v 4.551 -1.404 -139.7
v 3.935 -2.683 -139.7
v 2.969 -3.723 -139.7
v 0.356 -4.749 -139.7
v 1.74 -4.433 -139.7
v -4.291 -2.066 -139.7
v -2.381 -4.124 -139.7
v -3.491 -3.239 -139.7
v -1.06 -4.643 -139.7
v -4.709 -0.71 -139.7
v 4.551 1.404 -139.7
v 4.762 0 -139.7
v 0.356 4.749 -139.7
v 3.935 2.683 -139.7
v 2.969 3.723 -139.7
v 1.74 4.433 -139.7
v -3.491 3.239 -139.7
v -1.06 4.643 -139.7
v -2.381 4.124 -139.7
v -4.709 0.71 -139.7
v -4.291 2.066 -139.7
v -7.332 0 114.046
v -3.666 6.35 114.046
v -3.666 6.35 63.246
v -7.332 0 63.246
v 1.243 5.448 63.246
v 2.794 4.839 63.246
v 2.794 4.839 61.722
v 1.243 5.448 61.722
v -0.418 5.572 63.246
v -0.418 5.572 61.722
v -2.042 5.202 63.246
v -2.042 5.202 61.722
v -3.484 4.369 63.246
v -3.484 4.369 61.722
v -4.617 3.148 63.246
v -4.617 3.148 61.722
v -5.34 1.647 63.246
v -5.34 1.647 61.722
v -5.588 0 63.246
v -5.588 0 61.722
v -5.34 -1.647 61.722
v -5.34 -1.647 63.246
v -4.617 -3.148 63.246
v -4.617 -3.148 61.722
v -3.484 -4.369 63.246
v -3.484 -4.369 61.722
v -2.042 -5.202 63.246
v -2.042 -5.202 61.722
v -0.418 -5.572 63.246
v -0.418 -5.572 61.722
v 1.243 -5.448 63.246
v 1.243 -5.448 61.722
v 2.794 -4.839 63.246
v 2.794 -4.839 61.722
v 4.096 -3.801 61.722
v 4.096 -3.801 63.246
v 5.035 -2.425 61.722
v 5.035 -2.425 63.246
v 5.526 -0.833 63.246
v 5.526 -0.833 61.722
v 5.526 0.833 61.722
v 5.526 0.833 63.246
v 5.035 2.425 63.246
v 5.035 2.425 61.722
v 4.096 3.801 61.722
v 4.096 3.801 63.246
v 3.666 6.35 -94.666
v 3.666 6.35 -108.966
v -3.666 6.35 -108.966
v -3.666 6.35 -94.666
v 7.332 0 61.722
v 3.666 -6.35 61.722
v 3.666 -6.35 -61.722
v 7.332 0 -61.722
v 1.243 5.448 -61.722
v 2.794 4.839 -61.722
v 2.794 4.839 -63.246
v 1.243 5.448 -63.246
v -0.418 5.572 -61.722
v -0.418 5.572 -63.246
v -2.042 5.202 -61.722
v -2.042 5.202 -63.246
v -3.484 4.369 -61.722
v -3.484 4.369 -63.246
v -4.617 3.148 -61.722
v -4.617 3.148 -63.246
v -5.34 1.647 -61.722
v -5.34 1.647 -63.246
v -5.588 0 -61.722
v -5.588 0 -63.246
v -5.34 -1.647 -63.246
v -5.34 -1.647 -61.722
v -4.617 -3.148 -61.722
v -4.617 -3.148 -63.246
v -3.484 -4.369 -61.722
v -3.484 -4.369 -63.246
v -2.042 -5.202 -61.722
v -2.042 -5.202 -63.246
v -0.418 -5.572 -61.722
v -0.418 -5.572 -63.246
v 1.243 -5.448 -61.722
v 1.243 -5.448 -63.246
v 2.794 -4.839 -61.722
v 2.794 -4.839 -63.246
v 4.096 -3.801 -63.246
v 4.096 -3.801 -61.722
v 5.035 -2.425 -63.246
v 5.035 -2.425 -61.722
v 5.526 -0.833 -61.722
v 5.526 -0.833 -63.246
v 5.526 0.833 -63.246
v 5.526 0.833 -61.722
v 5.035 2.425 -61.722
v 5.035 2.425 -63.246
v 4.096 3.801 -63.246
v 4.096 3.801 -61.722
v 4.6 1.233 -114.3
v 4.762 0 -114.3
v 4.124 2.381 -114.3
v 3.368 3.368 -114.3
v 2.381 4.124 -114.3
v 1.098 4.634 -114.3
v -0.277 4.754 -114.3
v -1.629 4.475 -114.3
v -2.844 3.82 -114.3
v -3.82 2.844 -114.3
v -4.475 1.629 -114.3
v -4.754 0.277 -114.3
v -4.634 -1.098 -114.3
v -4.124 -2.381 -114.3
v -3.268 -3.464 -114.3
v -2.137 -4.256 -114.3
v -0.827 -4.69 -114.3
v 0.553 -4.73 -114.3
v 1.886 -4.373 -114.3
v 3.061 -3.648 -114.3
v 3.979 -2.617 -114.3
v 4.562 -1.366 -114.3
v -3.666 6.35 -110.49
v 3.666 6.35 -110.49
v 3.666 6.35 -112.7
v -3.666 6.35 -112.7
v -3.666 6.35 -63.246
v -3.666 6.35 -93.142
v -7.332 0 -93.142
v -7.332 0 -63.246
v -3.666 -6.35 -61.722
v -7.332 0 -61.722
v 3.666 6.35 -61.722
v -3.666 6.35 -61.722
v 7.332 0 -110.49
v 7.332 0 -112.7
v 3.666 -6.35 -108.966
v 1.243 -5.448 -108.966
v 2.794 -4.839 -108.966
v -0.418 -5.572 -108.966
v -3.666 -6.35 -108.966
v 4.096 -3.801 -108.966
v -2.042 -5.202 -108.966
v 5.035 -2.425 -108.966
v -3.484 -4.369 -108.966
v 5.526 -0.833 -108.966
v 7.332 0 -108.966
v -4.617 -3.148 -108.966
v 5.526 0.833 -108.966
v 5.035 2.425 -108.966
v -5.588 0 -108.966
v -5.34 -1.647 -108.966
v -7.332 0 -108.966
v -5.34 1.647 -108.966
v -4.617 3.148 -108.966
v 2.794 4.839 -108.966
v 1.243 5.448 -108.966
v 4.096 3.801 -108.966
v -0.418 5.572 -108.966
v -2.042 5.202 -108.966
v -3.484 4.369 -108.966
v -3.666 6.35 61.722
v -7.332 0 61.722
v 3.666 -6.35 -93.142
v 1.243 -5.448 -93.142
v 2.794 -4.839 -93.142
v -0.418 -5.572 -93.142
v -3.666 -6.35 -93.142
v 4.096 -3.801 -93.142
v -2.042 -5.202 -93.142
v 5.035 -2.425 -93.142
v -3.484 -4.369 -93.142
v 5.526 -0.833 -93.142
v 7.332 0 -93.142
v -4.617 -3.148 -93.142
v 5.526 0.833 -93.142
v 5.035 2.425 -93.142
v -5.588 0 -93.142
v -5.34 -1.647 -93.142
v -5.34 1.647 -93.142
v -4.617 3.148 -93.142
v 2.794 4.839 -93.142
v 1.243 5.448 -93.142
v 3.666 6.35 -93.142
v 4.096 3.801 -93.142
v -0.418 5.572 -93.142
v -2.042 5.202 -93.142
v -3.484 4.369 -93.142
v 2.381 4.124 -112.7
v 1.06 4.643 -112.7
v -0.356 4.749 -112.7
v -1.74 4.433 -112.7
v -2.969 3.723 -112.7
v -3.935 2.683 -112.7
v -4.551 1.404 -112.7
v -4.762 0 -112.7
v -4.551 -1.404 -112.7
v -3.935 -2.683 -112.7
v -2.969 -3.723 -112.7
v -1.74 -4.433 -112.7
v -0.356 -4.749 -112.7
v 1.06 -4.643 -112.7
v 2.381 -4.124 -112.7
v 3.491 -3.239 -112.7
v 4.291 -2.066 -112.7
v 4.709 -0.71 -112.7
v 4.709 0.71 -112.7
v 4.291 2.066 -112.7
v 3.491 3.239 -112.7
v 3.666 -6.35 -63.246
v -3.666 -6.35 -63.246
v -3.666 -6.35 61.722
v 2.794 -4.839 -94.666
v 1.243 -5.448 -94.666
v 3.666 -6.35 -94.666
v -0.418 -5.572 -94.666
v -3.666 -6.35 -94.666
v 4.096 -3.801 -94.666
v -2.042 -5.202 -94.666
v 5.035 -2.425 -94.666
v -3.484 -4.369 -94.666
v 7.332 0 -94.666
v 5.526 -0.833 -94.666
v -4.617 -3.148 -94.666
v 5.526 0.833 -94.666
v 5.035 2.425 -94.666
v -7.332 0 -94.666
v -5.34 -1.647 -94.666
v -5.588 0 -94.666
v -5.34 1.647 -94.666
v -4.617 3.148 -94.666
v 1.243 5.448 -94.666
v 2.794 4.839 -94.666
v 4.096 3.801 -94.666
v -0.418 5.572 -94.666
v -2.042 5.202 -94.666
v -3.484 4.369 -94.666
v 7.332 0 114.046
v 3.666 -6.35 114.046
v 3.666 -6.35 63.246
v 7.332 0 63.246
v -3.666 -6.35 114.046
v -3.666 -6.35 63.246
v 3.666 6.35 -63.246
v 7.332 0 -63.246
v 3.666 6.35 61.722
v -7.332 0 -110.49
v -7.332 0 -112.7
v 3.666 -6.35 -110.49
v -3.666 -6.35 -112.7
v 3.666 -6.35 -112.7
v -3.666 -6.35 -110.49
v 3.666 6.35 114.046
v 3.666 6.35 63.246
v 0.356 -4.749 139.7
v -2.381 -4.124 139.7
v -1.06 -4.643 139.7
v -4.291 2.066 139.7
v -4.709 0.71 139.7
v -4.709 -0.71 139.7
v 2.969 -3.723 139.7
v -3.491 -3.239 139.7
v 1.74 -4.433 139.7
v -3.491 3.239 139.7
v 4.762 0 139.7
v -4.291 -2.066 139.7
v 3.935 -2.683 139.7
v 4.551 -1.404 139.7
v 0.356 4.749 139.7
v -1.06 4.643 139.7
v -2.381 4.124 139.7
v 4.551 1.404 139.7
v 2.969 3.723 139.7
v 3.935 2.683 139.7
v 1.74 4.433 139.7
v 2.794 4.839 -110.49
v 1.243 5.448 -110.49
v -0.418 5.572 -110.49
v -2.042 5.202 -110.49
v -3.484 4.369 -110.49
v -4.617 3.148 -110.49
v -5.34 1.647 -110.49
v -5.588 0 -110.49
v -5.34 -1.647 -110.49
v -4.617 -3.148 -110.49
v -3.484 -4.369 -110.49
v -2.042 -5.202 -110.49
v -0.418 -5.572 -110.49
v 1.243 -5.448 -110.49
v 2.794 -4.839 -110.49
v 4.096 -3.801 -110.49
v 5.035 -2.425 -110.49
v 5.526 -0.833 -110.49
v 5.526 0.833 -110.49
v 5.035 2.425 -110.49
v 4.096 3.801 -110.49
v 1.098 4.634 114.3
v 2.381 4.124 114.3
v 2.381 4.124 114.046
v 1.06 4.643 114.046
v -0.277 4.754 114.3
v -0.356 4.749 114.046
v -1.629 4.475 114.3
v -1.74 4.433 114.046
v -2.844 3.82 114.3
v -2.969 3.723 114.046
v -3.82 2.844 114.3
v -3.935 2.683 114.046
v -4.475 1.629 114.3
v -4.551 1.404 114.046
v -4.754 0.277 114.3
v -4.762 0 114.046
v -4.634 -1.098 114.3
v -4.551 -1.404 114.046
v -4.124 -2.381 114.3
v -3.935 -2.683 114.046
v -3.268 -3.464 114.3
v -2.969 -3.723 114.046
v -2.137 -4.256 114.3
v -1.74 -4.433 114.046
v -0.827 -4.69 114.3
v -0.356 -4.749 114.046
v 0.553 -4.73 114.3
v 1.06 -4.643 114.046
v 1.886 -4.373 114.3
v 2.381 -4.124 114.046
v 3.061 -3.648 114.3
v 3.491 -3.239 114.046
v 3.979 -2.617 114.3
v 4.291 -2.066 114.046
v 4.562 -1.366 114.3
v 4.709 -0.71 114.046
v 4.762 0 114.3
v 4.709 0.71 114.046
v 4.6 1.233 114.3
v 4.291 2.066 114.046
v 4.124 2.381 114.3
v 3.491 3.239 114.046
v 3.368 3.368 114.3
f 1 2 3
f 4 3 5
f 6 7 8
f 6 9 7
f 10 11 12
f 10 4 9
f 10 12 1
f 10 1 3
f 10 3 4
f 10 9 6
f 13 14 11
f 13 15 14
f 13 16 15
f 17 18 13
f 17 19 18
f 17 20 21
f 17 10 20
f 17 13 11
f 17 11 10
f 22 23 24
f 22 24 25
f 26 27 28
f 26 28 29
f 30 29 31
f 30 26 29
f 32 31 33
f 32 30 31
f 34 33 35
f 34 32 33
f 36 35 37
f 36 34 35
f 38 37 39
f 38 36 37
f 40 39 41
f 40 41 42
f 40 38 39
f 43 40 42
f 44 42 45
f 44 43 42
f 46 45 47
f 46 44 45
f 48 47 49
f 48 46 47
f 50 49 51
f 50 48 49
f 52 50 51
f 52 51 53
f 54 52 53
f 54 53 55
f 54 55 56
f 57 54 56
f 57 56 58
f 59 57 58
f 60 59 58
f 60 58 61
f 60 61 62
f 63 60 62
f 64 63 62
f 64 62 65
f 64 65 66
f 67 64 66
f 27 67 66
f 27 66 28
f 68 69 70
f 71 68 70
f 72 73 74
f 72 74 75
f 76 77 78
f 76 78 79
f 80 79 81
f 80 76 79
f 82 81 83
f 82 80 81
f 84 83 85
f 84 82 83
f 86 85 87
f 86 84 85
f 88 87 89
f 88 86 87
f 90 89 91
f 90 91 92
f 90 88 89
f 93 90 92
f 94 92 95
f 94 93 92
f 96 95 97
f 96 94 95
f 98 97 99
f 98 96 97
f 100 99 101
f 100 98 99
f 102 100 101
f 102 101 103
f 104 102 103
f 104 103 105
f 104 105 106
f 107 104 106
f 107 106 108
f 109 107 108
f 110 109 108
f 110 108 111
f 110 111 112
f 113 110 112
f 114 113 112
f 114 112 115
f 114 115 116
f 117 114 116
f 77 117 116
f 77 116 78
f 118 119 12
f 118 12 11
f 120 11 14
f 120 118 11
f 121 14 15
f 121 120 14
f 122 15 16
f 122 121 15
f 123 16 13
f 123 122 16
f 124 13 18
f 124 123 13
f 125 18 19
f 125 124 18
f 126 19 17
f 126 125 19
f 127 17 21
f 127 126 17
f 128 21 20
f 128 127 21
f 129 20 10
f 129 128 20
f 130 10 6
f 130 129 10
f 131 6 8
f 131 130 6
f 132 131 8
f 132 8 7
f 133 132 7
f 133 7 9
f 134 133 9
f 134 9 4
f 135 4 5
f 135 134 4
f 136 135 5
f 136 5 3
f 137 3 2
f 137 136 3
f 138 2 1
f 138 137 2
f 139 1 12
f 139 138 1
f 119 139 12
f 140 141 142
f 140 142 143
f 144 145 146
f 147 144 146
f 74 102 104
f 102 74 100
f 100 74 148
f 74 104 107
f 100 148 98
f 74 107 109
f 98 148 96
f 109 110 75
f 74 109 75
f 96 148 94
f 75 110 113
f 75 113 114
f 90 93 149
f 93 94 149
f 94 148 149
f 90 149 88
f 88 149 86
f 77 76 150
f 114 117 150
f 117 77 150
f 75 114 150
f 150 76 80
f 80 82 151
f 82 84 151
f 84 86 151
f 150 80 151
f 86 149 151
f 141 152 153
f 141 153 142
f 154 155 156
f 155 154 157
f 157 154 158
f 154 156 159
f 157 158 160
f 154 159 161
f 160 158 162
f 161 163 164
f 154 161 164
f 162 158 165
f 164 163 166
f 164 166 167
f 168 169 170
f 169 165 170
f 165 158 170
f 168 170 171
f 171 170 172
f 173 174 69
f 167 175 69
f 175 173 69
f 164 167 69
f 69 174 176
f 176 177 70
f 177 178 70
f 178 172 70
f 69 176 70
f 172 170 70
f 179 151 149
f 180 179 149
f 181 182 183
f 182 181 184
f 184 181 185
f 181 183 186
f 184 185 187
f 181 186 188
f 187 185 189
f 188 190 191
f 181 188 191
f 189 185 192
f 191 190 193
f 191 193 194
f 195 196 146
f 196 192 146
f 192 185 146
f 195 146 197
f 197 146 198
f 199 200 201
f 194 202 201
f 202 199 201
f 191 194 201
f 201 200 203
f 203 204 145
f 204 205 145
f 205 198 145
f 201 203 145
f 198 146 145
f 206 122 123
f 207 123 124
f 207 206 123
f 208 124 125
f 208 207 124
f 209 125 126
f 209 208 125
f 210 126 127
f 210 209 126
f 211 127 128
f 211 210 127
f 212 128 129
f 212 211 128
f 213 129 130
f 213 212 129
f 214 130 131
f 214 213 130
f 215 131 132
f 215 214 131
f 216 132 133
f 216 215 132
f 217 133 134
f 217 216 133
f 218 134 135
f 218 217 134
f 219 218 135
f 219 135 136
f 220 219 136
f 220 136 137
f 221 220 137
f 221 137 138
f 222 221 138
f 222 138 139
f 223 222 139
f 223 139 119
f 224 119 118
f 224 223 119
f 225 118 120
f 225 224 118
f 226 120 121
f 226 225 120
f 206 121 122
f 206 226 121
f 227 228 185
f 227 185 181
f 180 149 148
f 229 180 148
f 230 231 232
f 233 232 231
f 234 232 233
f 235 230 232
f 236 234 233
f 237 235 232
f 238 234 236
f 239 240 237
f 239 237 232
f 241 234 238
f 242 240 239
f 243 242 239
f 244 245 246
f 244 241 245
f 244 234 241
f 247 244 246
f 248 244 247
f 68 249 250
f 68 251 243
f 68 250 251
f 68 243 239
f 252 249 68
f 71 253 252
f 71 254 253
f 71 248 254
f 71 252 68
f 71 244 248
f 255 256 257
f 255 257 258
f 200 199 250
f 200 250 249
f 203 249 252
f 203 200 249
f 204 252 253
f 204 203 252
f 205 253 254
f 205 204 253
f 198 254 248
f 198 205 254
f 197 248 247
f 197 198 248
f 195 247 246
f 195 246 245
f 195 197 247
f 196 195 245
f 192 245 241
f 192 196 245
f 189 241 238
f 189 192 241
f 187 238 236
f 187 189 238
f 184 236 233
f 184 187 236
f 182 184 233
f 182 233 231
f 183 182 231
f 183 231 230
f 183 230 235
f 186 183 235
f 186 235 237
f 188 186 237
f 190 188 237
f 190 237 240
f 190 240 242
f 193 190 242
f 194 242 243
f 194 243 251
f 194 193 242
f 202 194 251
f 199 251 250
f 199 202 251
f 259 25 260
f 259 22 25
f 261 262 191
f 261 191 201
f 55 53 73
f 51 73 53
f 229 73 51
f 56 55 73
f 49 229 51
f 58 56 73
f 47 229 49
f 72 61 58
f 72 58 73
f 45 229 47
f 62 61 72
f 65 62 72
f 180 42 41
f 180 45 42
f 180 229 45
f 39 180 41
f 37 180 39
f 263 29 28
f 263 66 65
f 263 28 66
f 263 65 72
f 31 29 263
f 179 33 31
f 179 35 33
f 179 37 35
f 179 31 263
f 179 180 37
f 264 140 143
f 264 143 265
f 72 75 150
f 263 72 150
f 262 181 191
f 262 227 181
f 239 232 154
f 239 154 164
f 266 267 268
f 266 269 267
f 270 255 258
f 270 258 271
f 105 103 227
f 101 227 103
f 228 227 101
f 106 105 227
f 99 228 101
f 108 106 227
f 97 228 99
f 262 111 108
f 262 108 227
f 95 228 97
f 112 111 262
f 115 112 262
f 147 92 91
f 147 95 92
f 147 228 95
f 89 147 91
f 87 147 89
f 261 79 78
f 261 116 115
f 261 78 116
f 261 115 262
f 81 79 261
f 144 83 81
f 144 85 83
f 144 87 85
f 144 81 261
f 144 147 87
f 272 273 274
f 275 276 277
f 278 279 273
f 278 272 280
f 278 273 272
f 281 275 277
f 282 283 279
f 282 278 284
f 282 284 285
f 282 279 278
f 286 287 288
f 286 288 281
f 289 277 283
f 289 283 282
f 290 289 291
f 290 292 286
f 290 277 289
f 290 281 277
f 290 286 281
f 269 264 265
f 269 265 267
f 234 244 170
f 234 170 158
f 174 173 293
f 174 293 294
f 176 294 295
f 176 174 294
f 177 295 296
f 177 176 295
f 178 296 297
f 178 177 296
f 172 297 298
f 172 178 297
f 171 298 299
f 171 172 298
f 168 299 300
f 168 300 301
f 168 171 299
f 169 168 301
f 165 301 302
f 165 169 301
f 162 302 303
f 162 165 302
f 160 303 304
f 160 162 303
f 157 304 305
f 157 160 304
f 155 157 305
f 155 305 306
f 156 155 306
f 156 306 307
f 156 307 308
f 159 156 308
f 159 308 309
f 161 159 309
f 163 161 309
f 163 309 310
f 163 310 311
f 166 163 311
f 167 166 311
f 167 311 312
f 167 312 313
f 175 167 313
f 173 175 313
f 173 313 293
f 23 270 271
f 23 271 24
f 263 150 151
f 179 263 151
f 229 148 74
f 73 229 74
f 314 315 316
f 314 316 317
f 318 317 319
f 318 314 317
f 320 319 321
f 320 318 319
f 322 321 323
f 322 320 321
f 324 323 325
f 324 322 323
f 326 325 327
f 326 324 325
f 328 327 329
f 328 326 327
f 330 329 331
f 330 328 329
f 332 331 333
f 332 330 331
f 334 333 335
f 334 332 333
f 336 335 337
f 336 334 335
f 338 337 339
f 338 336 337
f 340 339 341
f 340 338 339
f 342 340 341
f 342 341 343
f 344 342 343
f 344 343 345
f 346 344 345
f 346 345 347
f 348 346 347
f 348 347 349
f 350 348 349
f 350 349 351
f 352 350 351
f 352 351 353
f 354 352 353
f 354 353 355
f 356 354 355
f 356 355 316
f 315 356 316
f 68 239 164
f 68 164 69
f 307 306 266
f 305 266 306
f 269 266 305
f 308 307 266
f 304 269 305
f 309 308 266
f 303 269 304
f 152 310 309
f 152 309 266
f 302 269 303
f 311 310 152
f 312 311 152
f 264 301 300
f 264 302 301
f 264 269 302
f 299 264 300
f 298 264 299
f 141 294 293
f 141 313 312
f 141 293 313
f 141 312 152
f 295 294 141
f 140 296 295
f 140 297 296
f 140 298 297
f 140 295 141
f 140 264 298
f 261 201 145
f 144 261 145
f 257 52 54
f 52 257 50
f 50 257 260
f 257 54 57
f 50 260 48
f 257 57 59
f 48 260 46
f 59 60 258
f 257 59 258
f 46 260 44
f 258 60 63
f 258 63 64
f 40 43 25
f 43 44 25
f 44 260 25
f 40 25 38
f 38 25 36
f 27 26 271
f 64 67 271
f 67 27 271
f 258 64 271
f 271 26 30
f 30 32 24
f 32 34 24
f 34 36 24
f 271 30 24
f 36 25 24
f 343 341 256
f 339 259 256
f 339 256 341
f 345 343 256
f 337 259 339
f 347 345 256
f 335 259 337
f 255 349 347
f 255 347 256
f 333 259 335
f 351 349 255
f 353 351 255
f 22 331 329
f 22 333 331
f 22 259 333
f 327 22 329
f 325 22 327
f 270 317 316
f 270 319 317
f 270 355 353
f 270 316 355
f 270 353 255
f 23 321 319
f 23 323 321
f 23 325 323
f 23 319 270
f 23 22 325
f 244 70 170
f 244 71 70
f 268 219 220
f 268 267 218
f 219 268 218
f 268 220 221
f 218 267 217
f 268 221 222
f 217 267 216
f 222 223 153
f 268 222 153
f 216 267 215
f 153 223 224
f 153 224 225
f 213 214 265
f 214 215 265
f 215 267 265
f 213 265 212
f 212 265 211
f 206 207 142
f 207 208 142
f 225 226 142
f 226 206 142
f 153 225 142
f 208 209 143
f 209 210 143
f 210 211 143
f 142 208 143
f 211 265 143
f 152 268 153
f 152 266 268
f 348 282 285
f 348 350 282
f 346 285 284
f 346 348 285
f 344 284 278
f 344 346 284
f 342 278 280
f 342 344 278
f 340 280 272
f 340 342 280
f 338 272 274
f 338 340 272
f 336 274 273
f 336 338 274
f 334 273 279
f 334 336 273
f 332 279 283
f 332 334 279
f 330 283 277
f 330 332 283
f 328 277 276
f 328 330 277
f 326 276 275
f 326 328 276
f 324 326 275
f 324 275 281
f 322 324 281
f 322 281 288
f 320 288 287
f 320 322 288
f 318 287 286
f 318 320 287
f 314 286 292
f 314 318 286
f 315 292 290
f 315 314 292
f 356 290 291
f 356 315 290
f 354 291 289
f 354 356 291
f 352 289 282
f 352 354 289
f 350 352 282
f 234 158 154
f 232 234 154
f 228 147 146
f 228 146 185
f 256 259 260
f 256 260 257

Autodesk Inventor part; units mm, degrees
ref_plane "YZ Plane" through (0, 0, 0) normal (1, 0, 0) x (0, 1, 0)
sketch "Sketch1" plane through (0, 0, 0) normal (0, 0, 1) x (1, 0, 0)
  line L0 (7.3323, 0) -> (3.6662, -6.35)
  line L1 (3.6662, -6.35) -> (-3.6662, -6.35)
  line L2 (-3.6662, -6.35) -> (-7.3323, 0)
  line L3 (-7.3323, 0) -> (-3.6662, 6.35)
  line L4 (-3.6662, 6.35) -> (3.6662, 6.35)
  line L5 (3.6662, 6.35) -> (7.3323, 0)
  point P0 (0, 0)
  point P1 (0, 0)
  dimension "d0" = 12.7
extrude "Extrusion1" add sketch "Sketch1" along normal blind 114.3
sketch "Sketch2" plane through (0, 0, 114.3) normal (0, 0, 1) x (1, 0, 0)
  circle A0 centre (0, 0) radius 4.7625
  dimension "d3" = 9.525
extrude "Extrusion2" add sketch "Sketch2" along normal blind 25.4
mirror "Mirror1" about plane through (0, 0, 0) normal (0, 0, -1) of "Extrusion2", "Extrusion1"
ref_plane "Work Plane1" through (1.8331, 3.175, -114.3) normal (-0.8660254, 0.5, 0) x (0, 0, 1)
sketch "Sketch3" plane through (1.8331, 3.175, -114.3) normal (-0.8660254, 0.5, 0) x (0, 0, 1)
  line L0 (-25.4, 1.0963) -> (-25.4, -8.4287) construction
  line L1 (0, 1.0963) -> (0, -8.4287) construction
  line L2 (-25.4, 1.0963) -> (0, 1.0963) construction
  line L3 (-25.4, -8.4287) -> (0, -8.4287) construction
  line L4 (228.6, 3.6662) -> (0, 3.6662) construction
  line L5 (228.6, -7.3323) -> (228.6, 0) construction
  line L6 (228.6, 0) -> (0, 0) construction
  line L7 (0, -7.3323) -> (0, 0) construction
  line L8 (228.6, -7.3323) -> (0, -7.3323) construction
  line L9 (228.6, 0) -> (228.6, 3.6662) construction
  line L10 (228.6, 3.6662) -> (0, 3.6662) construction
  line L11 (0, 0) -> (0, 3.6662) construction
  line L12 (228.6, 0) -> (0, 0) construction
  line L13 (228.6, -10.9985) -> (228.6, -7.3323) construction
  line L14 (228.6, -7.3323) -> (0, -7.3323) construction
  line L15 (0, -10.9985) -> (0, -7.3323) construction
  line L16 (228.6, -10.9985) -> (0, -10.9985) construction
  line L17 (254, 1.0963) -> (254, -8.4287) construction
  line L18 (228.6, 1.0963) -> (228.6, -8.4287) construction
  line L19 (228.6, 1.0963) -> (254, 1.0963) construction
  line L20 (228.6, -8.4287) -> (254, -8.4287) construction
  line L21 (-25.4, -3.6662) -> (254, -3.6662) construction
  line L22 (3.81, 14.6218) -> (3.81, 1.9218)
  line L23 (3.81, 1.9218) -> (5.334, 1.9218)
  line L24 (5.334, 1.9218) -> (5.334, 14.6218)
  line L25 (5.334, 14.6218) -> (3.81, 14.6218)
  line L26 (19.6342, 14.6218) -> (19.6342, 1.9218)
  line L27 (19.6342, 1.9218) -> (21.1582, 1.9218)
  line L28 (21.1582, 1.9218) -> (21.1582, 14.6218)
  line L29 (21.1582, 14.6218) -> (19.6342, 14.6218)
  line L30 (0, 1.9218) -> (228.6, 1.9218) construction
  line L31 (51.054, 1.9218) -> (51.054, 14.6218)
  line L32 (51.054, 14.6218) -> (52.578, 14.6218)
  line L33 (52.578, 14.6218) -> (52.578, 1.9218)
  line L34 (51.054, 1.9218) -> (52.578, 1.9218)
  line L35 (176.022, 1.9218) -> (176.022, 14.6218)
  line L36 (176.022, 14.6218) -> (177.546, 14.6218)
  line L37 (177.546, 14.6218) -> (177.546, 1.9218)
  line L38 (176.022, 1.9218) -> (177.546, 1.9218)
  line L39 (0, 13.7963) -> (0, 1.0963)
  line L40 (0, 1.0963) -> (1.6002, 1.0963)
  line L41 (1.6002, 1.0963) -> (1.6002, 13.7963)
  line L42 (1.6002, 13.7963) -> (0, 13.7963)
  line L43 (228.346, 13.7963) -> (228.346, 1.0963)
  line L44 (228.346, 1.0963) -> (228.6, 1.0963)
  line L45 (228.6, 1.0963) -> (228.6, 13.7963)
  line L46 (228.6, 13.7963) -> (228.346, 13.7963)
  point P0 (114.3, -3.6662)
  dimension "d6" = 12.7
  dimension "d7" = 1.524
  dimension "d10" = 1.524
  dimension "d11" = 5.588
  dimension "d13" = 1.524
  dimension "d14" = 1.524
  dimension "d16" = 14.3002
  dimension "d18" = 123.444
  dimension "d19" = 61.722
  dimension "d23" = 1.6002
  dimension "d24" = 12.7
  dimension "d25" = 12.7
  dimension "d26" = 0.254
  dimension "d27" = 3.81
revolve "Revolution1" cut sketch "Sketch3" angle 360 about axis through (0, 0, -139.7) along (0, 0, 1)
ref_plane "Work Plane2" through (-3.6662, -6.35, 0) normal (0, 0, 1) x (1, 0, 0)
equation "\"d10\" = d7"
equation "\"d13\" = d7"
equation "\"d14\" = d7"
equation "\"d19\" = 0.5 * d18"
equation "\"d25\" = d6"
properties part number "0.5 in Hex Shaft V3" material "Steel"
